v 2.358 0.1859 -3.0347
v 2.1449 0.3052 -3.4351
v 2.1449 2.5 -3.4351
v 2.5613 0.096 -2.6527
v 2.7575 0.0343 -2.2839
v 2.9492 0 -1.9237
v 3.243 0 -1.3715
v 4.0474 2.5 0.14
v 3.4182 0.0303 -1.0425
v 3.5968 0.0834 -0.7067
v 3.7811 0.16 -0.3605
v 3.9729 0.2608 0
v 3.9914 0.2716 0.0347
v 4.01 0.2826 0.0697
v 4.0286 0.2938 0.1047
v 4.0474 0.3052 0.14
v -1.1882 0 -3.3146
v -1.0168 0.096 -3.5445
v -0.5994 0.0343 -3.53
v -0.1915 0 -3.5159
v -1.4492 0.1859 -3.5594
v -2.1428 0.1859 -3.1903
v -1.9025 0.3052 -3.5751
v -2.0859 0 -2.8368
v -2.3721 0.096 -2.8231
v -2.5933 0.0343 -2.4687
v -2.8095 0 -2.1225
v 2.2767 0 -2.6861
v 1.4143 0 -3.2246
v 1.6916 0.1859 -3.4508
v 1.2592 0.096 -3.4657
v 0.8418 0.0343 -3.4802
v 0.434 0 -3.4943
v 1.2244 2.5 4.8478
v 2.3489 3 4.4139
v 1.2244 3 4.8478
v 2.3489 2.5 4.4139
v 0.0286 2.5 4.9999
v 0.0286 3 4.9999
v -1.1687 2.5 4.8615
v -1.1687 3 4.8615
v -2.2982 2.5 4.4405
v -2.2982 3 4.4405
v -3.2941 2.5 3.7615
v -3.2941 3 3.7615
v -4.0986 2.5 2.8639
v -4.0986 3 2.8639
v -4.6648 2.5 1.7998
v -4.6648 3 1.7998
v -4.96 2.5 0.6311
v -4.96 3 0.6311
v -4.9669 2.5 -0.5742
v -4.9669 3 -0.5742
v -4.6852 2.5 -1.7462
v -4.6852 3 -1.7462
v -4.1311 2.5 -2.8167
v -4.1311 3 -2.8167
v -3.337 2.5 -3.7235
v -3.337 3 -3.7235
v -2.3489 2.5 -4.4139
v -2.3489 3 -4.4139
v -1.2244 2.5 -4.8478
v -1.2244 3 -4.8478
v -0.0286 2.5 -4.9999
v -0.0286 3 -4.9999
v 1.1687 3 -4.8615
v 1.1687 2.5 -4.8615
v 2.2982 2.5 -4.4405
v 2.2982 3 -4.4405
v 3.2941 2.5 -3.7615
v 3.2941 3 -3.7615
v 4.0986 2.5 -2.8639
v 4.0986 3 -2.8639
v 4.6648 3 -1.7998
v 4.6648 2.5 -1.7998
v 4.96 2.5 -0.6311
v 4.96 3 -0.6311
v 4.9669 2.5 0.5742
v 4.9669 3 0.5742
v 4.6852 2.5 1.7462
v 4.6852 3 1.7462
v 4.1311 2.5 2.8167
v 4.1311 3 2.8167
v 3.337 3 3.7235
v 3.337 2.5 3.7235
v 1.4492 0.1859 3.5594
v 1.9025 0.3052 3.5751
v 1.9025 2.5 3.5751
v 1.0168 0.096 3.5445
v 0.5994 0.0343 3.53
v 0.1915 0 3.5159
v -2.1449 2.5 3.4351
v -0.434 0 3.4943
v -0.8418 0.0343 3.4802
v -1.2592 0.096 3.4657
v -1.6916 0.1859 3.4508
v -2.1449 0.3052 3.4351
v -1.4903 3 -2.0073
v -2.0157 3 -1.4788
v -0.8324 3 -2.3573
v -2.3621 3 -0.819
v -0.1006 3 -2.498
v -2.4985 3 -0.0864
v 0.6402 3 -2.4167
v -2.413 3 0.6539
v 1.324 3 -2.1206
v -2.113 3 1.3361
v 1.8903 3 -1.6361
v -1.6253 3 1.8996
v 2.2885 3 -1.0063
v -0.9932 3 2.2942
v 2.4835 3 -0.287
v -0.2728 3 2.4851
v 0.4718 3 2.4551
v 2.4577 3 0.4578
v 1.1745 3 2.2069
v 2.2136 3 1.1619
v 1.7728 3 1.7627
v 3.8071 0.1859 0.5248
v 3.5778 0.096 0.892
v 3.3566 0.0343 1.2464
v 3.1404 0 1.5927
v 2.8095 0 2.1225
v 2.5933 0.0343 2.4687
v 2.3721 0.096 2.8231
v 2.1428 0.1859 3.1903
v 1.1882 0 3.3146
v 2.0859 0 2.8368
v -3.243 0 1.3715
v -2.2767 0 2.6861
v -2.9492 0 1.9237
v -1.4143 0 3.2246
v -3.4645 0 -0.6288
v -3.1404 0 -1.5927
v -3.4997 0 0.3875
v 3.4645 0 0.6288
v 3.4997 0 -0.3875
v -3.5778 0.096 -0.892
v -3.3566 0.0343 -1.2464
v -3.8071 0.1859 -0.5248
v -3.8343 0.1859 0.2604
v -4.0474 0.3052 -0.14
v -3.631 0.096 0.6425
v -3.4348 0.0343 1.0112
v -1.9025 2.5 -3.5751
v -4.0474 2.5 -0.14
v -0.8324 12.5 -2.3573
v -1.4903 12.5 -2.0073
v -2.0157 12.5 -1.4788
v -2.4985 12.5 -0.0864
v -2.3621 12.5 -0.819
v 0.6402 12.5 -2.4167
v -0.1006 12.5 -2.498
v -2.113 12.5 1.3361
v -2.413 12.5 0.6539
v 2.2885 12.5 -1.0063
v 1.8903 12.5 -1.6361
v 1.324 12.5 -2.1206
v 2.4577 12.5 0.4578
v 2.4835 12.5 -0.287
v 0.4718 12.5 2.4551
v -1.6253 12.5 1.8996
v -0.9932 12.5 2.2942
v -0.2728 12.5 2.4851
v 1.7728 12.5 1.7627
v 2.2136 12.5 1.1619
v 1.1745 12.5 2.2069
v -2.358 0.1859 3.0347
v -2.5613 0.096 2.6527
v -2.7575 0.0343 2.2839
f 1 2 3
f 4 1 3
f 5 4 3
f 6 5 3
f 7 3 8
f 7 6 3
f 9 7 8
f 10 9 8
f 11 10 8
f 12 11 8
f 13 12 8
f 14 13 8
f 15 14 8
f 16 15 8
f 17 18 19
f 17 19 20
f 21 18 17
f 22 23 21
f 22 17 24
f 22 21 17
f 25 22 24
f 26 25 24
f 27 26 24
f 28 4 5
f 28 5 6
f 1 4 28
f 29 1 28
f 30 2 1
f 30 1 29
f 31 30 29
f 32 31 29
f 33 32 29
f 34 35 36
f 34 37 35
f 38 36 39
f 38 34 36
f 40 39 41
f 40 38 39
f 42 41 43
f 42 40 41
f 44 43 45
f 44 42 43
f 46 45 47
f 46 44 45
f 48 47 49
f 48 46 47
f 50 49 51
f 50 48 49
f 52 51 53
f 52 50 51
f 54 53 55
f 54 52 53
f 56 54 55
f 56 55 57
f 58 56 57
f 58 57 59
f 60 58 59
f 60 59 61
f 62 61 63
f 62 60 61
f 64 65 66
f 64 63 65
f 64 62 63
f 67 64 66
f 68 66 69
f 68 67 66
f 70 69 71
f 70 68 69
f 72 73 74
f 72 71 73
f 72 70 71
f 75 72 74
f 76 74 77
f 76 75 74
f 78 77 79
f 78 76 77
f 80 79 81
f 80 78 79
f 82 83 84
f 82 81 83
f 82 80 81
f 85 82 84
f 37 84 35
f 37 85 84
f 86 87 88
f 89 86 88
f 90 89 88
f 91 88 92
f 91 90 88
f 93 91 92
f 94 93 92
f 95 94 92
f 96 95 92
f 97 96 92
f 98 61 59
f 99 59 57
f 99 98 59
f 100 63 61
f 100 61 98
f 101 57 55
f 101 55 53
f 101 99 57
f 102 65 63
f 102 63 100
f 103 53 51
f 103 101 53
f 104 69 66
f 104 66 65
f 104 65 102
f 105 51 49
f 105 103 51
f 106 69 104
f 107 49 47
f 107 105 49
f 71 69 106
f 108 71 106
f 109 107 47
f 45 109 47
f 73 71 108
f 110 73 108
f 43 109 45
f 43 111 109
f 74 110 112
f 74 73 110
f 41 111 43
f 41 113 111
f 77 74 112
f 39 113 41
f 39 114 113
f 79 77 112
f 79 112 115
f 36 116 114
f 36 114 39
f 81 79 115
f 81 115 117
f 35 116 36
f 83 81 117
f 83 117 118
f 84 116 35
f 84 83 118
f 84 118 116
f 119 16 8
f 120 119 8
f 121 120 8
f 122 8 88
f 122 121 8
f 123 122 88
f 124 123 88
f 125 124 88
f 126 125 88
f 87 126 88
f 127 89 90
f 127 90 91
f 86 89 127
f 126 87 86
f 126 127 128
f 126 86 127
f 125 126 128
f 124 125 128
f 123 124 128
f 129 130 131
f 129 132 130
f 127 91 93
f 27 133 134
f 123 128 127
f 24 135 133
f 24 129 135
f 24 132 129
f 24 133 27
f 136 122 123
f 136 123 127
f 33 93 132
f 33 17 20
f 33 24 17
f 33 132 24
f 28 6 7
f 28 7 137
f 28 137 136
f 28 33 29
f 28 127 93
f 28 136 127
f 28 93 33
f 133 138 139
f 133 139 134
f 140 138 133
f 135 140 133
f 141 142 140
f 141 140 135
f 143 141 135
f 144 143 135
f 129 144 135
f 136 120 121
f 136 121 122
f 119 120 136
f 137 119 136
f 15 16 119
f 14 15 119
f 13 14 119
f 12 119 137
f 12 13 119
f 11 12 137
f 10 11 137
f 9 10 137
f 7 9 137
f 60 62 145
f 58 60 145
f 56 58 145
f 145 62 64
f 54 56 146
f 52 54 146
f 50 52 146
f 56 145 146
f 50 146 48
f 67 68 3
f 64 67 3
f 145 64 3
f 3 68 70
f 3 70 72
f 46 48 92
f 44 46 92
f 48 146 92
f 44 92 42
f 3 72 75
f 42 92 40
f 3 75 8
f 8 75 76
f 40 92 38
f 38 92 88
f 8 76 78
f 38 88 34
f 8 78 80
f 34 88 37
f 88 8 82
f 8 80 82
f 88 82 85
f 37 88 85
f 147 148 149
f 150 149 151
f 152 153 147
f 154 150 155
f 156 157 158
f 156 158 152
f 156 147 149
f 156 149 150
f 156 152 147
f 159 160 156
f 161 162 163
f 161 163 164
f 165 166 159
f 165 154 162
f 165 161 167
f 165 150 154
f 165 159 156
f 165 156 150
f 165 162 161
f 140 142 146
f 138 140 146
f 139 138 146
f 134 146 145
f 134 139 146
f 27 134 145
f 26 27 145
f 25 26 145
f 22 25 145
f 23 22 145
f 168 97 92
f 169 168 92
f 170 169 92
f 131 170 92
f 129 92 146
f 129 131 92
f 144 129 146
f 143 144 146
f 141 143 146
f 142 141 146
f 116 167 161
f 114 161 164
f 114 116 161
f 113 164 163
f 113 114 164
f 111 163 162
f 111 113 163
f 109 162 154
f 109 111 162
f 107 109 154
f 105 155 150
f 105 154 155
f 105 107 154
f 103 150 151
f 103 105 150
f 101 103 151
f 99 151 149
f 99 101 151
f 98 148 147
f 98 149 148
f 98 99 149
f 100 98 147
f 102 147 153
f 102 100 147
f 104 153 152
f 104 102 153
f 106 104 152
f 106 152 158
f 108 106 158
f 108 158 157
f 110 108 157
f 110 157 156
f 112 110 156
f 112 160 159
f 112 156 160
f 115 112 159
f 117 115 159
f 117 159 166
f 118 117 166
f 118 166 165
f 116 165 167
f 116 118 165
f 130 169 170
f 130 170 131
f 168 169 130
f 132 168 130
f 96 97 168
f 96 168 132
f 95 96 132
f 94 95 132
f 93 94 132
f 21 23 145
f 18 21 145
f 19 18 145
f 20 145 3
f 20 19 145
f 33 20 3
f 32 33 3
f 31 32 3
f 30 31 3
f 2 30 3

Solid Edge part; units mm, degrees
sketch "Sketch1" plane through (0, 0, 0) normal (0, -1, 0) x (1, 0, 0)
  line L0 (4.0474, 0.14) -> (1.9025, 3.5751)
  line L1 (1.9025, 3.5751) -> (-2.1449, 3.4351)
  line L2 (-2.1449, 3.4351) -> (-4.0474, -0.14)
  line L3 (-4.0474, -0.14) -> (-1.9025, -3.5751)
  line L4 (-1.9025, -3.5751) -> (2.1449, -3.4351)
  line L5 (2.1449, -3.4351) -> (4.0474, 0.14)
extrude "Protrusion1" add sketch "Sketch1" against normal blind 2.5
sketch "Sketch2" plane through (0, 2.5, 0) normal (0, 1, 0) x (0.4698, 0, 0.8828)
  circle A0 centre (0, 0) radius 5
extrude "ExtrudedProtrusion_4" add sketch "Sketch2" along normal blind 0.5
sketch "Sketch3" plane through (0, 2.5, 0) normal (0, 1, 0) x (0.4698, 0, 0.8828)
  circle A0 centre (0, 0) radius 2.5
extrude "ExtrudedProtrusion_5" add sketch "Sketch3" along normal blind 10
sketch "Sketch4" plane through (1.5498, 1.5498, 0) normal (0, 0, -1) x (-1, 0, 0)
  line L0 (-1.9502, -1.562) -> (-3.6822, -0.562)
  line L1 (1.5498, -1.562) -> (-1.9502, -1.562)
  line L2 (1.5498, -1.562) -> (1.5498, -1.5498)
revolve "RevolvedCutout1" cut sketch "Sketch4" angle 360 about axis through (0, -3.0266, 0) along (0, 1, 0) material side at (4.391, 0.4445, 0)
